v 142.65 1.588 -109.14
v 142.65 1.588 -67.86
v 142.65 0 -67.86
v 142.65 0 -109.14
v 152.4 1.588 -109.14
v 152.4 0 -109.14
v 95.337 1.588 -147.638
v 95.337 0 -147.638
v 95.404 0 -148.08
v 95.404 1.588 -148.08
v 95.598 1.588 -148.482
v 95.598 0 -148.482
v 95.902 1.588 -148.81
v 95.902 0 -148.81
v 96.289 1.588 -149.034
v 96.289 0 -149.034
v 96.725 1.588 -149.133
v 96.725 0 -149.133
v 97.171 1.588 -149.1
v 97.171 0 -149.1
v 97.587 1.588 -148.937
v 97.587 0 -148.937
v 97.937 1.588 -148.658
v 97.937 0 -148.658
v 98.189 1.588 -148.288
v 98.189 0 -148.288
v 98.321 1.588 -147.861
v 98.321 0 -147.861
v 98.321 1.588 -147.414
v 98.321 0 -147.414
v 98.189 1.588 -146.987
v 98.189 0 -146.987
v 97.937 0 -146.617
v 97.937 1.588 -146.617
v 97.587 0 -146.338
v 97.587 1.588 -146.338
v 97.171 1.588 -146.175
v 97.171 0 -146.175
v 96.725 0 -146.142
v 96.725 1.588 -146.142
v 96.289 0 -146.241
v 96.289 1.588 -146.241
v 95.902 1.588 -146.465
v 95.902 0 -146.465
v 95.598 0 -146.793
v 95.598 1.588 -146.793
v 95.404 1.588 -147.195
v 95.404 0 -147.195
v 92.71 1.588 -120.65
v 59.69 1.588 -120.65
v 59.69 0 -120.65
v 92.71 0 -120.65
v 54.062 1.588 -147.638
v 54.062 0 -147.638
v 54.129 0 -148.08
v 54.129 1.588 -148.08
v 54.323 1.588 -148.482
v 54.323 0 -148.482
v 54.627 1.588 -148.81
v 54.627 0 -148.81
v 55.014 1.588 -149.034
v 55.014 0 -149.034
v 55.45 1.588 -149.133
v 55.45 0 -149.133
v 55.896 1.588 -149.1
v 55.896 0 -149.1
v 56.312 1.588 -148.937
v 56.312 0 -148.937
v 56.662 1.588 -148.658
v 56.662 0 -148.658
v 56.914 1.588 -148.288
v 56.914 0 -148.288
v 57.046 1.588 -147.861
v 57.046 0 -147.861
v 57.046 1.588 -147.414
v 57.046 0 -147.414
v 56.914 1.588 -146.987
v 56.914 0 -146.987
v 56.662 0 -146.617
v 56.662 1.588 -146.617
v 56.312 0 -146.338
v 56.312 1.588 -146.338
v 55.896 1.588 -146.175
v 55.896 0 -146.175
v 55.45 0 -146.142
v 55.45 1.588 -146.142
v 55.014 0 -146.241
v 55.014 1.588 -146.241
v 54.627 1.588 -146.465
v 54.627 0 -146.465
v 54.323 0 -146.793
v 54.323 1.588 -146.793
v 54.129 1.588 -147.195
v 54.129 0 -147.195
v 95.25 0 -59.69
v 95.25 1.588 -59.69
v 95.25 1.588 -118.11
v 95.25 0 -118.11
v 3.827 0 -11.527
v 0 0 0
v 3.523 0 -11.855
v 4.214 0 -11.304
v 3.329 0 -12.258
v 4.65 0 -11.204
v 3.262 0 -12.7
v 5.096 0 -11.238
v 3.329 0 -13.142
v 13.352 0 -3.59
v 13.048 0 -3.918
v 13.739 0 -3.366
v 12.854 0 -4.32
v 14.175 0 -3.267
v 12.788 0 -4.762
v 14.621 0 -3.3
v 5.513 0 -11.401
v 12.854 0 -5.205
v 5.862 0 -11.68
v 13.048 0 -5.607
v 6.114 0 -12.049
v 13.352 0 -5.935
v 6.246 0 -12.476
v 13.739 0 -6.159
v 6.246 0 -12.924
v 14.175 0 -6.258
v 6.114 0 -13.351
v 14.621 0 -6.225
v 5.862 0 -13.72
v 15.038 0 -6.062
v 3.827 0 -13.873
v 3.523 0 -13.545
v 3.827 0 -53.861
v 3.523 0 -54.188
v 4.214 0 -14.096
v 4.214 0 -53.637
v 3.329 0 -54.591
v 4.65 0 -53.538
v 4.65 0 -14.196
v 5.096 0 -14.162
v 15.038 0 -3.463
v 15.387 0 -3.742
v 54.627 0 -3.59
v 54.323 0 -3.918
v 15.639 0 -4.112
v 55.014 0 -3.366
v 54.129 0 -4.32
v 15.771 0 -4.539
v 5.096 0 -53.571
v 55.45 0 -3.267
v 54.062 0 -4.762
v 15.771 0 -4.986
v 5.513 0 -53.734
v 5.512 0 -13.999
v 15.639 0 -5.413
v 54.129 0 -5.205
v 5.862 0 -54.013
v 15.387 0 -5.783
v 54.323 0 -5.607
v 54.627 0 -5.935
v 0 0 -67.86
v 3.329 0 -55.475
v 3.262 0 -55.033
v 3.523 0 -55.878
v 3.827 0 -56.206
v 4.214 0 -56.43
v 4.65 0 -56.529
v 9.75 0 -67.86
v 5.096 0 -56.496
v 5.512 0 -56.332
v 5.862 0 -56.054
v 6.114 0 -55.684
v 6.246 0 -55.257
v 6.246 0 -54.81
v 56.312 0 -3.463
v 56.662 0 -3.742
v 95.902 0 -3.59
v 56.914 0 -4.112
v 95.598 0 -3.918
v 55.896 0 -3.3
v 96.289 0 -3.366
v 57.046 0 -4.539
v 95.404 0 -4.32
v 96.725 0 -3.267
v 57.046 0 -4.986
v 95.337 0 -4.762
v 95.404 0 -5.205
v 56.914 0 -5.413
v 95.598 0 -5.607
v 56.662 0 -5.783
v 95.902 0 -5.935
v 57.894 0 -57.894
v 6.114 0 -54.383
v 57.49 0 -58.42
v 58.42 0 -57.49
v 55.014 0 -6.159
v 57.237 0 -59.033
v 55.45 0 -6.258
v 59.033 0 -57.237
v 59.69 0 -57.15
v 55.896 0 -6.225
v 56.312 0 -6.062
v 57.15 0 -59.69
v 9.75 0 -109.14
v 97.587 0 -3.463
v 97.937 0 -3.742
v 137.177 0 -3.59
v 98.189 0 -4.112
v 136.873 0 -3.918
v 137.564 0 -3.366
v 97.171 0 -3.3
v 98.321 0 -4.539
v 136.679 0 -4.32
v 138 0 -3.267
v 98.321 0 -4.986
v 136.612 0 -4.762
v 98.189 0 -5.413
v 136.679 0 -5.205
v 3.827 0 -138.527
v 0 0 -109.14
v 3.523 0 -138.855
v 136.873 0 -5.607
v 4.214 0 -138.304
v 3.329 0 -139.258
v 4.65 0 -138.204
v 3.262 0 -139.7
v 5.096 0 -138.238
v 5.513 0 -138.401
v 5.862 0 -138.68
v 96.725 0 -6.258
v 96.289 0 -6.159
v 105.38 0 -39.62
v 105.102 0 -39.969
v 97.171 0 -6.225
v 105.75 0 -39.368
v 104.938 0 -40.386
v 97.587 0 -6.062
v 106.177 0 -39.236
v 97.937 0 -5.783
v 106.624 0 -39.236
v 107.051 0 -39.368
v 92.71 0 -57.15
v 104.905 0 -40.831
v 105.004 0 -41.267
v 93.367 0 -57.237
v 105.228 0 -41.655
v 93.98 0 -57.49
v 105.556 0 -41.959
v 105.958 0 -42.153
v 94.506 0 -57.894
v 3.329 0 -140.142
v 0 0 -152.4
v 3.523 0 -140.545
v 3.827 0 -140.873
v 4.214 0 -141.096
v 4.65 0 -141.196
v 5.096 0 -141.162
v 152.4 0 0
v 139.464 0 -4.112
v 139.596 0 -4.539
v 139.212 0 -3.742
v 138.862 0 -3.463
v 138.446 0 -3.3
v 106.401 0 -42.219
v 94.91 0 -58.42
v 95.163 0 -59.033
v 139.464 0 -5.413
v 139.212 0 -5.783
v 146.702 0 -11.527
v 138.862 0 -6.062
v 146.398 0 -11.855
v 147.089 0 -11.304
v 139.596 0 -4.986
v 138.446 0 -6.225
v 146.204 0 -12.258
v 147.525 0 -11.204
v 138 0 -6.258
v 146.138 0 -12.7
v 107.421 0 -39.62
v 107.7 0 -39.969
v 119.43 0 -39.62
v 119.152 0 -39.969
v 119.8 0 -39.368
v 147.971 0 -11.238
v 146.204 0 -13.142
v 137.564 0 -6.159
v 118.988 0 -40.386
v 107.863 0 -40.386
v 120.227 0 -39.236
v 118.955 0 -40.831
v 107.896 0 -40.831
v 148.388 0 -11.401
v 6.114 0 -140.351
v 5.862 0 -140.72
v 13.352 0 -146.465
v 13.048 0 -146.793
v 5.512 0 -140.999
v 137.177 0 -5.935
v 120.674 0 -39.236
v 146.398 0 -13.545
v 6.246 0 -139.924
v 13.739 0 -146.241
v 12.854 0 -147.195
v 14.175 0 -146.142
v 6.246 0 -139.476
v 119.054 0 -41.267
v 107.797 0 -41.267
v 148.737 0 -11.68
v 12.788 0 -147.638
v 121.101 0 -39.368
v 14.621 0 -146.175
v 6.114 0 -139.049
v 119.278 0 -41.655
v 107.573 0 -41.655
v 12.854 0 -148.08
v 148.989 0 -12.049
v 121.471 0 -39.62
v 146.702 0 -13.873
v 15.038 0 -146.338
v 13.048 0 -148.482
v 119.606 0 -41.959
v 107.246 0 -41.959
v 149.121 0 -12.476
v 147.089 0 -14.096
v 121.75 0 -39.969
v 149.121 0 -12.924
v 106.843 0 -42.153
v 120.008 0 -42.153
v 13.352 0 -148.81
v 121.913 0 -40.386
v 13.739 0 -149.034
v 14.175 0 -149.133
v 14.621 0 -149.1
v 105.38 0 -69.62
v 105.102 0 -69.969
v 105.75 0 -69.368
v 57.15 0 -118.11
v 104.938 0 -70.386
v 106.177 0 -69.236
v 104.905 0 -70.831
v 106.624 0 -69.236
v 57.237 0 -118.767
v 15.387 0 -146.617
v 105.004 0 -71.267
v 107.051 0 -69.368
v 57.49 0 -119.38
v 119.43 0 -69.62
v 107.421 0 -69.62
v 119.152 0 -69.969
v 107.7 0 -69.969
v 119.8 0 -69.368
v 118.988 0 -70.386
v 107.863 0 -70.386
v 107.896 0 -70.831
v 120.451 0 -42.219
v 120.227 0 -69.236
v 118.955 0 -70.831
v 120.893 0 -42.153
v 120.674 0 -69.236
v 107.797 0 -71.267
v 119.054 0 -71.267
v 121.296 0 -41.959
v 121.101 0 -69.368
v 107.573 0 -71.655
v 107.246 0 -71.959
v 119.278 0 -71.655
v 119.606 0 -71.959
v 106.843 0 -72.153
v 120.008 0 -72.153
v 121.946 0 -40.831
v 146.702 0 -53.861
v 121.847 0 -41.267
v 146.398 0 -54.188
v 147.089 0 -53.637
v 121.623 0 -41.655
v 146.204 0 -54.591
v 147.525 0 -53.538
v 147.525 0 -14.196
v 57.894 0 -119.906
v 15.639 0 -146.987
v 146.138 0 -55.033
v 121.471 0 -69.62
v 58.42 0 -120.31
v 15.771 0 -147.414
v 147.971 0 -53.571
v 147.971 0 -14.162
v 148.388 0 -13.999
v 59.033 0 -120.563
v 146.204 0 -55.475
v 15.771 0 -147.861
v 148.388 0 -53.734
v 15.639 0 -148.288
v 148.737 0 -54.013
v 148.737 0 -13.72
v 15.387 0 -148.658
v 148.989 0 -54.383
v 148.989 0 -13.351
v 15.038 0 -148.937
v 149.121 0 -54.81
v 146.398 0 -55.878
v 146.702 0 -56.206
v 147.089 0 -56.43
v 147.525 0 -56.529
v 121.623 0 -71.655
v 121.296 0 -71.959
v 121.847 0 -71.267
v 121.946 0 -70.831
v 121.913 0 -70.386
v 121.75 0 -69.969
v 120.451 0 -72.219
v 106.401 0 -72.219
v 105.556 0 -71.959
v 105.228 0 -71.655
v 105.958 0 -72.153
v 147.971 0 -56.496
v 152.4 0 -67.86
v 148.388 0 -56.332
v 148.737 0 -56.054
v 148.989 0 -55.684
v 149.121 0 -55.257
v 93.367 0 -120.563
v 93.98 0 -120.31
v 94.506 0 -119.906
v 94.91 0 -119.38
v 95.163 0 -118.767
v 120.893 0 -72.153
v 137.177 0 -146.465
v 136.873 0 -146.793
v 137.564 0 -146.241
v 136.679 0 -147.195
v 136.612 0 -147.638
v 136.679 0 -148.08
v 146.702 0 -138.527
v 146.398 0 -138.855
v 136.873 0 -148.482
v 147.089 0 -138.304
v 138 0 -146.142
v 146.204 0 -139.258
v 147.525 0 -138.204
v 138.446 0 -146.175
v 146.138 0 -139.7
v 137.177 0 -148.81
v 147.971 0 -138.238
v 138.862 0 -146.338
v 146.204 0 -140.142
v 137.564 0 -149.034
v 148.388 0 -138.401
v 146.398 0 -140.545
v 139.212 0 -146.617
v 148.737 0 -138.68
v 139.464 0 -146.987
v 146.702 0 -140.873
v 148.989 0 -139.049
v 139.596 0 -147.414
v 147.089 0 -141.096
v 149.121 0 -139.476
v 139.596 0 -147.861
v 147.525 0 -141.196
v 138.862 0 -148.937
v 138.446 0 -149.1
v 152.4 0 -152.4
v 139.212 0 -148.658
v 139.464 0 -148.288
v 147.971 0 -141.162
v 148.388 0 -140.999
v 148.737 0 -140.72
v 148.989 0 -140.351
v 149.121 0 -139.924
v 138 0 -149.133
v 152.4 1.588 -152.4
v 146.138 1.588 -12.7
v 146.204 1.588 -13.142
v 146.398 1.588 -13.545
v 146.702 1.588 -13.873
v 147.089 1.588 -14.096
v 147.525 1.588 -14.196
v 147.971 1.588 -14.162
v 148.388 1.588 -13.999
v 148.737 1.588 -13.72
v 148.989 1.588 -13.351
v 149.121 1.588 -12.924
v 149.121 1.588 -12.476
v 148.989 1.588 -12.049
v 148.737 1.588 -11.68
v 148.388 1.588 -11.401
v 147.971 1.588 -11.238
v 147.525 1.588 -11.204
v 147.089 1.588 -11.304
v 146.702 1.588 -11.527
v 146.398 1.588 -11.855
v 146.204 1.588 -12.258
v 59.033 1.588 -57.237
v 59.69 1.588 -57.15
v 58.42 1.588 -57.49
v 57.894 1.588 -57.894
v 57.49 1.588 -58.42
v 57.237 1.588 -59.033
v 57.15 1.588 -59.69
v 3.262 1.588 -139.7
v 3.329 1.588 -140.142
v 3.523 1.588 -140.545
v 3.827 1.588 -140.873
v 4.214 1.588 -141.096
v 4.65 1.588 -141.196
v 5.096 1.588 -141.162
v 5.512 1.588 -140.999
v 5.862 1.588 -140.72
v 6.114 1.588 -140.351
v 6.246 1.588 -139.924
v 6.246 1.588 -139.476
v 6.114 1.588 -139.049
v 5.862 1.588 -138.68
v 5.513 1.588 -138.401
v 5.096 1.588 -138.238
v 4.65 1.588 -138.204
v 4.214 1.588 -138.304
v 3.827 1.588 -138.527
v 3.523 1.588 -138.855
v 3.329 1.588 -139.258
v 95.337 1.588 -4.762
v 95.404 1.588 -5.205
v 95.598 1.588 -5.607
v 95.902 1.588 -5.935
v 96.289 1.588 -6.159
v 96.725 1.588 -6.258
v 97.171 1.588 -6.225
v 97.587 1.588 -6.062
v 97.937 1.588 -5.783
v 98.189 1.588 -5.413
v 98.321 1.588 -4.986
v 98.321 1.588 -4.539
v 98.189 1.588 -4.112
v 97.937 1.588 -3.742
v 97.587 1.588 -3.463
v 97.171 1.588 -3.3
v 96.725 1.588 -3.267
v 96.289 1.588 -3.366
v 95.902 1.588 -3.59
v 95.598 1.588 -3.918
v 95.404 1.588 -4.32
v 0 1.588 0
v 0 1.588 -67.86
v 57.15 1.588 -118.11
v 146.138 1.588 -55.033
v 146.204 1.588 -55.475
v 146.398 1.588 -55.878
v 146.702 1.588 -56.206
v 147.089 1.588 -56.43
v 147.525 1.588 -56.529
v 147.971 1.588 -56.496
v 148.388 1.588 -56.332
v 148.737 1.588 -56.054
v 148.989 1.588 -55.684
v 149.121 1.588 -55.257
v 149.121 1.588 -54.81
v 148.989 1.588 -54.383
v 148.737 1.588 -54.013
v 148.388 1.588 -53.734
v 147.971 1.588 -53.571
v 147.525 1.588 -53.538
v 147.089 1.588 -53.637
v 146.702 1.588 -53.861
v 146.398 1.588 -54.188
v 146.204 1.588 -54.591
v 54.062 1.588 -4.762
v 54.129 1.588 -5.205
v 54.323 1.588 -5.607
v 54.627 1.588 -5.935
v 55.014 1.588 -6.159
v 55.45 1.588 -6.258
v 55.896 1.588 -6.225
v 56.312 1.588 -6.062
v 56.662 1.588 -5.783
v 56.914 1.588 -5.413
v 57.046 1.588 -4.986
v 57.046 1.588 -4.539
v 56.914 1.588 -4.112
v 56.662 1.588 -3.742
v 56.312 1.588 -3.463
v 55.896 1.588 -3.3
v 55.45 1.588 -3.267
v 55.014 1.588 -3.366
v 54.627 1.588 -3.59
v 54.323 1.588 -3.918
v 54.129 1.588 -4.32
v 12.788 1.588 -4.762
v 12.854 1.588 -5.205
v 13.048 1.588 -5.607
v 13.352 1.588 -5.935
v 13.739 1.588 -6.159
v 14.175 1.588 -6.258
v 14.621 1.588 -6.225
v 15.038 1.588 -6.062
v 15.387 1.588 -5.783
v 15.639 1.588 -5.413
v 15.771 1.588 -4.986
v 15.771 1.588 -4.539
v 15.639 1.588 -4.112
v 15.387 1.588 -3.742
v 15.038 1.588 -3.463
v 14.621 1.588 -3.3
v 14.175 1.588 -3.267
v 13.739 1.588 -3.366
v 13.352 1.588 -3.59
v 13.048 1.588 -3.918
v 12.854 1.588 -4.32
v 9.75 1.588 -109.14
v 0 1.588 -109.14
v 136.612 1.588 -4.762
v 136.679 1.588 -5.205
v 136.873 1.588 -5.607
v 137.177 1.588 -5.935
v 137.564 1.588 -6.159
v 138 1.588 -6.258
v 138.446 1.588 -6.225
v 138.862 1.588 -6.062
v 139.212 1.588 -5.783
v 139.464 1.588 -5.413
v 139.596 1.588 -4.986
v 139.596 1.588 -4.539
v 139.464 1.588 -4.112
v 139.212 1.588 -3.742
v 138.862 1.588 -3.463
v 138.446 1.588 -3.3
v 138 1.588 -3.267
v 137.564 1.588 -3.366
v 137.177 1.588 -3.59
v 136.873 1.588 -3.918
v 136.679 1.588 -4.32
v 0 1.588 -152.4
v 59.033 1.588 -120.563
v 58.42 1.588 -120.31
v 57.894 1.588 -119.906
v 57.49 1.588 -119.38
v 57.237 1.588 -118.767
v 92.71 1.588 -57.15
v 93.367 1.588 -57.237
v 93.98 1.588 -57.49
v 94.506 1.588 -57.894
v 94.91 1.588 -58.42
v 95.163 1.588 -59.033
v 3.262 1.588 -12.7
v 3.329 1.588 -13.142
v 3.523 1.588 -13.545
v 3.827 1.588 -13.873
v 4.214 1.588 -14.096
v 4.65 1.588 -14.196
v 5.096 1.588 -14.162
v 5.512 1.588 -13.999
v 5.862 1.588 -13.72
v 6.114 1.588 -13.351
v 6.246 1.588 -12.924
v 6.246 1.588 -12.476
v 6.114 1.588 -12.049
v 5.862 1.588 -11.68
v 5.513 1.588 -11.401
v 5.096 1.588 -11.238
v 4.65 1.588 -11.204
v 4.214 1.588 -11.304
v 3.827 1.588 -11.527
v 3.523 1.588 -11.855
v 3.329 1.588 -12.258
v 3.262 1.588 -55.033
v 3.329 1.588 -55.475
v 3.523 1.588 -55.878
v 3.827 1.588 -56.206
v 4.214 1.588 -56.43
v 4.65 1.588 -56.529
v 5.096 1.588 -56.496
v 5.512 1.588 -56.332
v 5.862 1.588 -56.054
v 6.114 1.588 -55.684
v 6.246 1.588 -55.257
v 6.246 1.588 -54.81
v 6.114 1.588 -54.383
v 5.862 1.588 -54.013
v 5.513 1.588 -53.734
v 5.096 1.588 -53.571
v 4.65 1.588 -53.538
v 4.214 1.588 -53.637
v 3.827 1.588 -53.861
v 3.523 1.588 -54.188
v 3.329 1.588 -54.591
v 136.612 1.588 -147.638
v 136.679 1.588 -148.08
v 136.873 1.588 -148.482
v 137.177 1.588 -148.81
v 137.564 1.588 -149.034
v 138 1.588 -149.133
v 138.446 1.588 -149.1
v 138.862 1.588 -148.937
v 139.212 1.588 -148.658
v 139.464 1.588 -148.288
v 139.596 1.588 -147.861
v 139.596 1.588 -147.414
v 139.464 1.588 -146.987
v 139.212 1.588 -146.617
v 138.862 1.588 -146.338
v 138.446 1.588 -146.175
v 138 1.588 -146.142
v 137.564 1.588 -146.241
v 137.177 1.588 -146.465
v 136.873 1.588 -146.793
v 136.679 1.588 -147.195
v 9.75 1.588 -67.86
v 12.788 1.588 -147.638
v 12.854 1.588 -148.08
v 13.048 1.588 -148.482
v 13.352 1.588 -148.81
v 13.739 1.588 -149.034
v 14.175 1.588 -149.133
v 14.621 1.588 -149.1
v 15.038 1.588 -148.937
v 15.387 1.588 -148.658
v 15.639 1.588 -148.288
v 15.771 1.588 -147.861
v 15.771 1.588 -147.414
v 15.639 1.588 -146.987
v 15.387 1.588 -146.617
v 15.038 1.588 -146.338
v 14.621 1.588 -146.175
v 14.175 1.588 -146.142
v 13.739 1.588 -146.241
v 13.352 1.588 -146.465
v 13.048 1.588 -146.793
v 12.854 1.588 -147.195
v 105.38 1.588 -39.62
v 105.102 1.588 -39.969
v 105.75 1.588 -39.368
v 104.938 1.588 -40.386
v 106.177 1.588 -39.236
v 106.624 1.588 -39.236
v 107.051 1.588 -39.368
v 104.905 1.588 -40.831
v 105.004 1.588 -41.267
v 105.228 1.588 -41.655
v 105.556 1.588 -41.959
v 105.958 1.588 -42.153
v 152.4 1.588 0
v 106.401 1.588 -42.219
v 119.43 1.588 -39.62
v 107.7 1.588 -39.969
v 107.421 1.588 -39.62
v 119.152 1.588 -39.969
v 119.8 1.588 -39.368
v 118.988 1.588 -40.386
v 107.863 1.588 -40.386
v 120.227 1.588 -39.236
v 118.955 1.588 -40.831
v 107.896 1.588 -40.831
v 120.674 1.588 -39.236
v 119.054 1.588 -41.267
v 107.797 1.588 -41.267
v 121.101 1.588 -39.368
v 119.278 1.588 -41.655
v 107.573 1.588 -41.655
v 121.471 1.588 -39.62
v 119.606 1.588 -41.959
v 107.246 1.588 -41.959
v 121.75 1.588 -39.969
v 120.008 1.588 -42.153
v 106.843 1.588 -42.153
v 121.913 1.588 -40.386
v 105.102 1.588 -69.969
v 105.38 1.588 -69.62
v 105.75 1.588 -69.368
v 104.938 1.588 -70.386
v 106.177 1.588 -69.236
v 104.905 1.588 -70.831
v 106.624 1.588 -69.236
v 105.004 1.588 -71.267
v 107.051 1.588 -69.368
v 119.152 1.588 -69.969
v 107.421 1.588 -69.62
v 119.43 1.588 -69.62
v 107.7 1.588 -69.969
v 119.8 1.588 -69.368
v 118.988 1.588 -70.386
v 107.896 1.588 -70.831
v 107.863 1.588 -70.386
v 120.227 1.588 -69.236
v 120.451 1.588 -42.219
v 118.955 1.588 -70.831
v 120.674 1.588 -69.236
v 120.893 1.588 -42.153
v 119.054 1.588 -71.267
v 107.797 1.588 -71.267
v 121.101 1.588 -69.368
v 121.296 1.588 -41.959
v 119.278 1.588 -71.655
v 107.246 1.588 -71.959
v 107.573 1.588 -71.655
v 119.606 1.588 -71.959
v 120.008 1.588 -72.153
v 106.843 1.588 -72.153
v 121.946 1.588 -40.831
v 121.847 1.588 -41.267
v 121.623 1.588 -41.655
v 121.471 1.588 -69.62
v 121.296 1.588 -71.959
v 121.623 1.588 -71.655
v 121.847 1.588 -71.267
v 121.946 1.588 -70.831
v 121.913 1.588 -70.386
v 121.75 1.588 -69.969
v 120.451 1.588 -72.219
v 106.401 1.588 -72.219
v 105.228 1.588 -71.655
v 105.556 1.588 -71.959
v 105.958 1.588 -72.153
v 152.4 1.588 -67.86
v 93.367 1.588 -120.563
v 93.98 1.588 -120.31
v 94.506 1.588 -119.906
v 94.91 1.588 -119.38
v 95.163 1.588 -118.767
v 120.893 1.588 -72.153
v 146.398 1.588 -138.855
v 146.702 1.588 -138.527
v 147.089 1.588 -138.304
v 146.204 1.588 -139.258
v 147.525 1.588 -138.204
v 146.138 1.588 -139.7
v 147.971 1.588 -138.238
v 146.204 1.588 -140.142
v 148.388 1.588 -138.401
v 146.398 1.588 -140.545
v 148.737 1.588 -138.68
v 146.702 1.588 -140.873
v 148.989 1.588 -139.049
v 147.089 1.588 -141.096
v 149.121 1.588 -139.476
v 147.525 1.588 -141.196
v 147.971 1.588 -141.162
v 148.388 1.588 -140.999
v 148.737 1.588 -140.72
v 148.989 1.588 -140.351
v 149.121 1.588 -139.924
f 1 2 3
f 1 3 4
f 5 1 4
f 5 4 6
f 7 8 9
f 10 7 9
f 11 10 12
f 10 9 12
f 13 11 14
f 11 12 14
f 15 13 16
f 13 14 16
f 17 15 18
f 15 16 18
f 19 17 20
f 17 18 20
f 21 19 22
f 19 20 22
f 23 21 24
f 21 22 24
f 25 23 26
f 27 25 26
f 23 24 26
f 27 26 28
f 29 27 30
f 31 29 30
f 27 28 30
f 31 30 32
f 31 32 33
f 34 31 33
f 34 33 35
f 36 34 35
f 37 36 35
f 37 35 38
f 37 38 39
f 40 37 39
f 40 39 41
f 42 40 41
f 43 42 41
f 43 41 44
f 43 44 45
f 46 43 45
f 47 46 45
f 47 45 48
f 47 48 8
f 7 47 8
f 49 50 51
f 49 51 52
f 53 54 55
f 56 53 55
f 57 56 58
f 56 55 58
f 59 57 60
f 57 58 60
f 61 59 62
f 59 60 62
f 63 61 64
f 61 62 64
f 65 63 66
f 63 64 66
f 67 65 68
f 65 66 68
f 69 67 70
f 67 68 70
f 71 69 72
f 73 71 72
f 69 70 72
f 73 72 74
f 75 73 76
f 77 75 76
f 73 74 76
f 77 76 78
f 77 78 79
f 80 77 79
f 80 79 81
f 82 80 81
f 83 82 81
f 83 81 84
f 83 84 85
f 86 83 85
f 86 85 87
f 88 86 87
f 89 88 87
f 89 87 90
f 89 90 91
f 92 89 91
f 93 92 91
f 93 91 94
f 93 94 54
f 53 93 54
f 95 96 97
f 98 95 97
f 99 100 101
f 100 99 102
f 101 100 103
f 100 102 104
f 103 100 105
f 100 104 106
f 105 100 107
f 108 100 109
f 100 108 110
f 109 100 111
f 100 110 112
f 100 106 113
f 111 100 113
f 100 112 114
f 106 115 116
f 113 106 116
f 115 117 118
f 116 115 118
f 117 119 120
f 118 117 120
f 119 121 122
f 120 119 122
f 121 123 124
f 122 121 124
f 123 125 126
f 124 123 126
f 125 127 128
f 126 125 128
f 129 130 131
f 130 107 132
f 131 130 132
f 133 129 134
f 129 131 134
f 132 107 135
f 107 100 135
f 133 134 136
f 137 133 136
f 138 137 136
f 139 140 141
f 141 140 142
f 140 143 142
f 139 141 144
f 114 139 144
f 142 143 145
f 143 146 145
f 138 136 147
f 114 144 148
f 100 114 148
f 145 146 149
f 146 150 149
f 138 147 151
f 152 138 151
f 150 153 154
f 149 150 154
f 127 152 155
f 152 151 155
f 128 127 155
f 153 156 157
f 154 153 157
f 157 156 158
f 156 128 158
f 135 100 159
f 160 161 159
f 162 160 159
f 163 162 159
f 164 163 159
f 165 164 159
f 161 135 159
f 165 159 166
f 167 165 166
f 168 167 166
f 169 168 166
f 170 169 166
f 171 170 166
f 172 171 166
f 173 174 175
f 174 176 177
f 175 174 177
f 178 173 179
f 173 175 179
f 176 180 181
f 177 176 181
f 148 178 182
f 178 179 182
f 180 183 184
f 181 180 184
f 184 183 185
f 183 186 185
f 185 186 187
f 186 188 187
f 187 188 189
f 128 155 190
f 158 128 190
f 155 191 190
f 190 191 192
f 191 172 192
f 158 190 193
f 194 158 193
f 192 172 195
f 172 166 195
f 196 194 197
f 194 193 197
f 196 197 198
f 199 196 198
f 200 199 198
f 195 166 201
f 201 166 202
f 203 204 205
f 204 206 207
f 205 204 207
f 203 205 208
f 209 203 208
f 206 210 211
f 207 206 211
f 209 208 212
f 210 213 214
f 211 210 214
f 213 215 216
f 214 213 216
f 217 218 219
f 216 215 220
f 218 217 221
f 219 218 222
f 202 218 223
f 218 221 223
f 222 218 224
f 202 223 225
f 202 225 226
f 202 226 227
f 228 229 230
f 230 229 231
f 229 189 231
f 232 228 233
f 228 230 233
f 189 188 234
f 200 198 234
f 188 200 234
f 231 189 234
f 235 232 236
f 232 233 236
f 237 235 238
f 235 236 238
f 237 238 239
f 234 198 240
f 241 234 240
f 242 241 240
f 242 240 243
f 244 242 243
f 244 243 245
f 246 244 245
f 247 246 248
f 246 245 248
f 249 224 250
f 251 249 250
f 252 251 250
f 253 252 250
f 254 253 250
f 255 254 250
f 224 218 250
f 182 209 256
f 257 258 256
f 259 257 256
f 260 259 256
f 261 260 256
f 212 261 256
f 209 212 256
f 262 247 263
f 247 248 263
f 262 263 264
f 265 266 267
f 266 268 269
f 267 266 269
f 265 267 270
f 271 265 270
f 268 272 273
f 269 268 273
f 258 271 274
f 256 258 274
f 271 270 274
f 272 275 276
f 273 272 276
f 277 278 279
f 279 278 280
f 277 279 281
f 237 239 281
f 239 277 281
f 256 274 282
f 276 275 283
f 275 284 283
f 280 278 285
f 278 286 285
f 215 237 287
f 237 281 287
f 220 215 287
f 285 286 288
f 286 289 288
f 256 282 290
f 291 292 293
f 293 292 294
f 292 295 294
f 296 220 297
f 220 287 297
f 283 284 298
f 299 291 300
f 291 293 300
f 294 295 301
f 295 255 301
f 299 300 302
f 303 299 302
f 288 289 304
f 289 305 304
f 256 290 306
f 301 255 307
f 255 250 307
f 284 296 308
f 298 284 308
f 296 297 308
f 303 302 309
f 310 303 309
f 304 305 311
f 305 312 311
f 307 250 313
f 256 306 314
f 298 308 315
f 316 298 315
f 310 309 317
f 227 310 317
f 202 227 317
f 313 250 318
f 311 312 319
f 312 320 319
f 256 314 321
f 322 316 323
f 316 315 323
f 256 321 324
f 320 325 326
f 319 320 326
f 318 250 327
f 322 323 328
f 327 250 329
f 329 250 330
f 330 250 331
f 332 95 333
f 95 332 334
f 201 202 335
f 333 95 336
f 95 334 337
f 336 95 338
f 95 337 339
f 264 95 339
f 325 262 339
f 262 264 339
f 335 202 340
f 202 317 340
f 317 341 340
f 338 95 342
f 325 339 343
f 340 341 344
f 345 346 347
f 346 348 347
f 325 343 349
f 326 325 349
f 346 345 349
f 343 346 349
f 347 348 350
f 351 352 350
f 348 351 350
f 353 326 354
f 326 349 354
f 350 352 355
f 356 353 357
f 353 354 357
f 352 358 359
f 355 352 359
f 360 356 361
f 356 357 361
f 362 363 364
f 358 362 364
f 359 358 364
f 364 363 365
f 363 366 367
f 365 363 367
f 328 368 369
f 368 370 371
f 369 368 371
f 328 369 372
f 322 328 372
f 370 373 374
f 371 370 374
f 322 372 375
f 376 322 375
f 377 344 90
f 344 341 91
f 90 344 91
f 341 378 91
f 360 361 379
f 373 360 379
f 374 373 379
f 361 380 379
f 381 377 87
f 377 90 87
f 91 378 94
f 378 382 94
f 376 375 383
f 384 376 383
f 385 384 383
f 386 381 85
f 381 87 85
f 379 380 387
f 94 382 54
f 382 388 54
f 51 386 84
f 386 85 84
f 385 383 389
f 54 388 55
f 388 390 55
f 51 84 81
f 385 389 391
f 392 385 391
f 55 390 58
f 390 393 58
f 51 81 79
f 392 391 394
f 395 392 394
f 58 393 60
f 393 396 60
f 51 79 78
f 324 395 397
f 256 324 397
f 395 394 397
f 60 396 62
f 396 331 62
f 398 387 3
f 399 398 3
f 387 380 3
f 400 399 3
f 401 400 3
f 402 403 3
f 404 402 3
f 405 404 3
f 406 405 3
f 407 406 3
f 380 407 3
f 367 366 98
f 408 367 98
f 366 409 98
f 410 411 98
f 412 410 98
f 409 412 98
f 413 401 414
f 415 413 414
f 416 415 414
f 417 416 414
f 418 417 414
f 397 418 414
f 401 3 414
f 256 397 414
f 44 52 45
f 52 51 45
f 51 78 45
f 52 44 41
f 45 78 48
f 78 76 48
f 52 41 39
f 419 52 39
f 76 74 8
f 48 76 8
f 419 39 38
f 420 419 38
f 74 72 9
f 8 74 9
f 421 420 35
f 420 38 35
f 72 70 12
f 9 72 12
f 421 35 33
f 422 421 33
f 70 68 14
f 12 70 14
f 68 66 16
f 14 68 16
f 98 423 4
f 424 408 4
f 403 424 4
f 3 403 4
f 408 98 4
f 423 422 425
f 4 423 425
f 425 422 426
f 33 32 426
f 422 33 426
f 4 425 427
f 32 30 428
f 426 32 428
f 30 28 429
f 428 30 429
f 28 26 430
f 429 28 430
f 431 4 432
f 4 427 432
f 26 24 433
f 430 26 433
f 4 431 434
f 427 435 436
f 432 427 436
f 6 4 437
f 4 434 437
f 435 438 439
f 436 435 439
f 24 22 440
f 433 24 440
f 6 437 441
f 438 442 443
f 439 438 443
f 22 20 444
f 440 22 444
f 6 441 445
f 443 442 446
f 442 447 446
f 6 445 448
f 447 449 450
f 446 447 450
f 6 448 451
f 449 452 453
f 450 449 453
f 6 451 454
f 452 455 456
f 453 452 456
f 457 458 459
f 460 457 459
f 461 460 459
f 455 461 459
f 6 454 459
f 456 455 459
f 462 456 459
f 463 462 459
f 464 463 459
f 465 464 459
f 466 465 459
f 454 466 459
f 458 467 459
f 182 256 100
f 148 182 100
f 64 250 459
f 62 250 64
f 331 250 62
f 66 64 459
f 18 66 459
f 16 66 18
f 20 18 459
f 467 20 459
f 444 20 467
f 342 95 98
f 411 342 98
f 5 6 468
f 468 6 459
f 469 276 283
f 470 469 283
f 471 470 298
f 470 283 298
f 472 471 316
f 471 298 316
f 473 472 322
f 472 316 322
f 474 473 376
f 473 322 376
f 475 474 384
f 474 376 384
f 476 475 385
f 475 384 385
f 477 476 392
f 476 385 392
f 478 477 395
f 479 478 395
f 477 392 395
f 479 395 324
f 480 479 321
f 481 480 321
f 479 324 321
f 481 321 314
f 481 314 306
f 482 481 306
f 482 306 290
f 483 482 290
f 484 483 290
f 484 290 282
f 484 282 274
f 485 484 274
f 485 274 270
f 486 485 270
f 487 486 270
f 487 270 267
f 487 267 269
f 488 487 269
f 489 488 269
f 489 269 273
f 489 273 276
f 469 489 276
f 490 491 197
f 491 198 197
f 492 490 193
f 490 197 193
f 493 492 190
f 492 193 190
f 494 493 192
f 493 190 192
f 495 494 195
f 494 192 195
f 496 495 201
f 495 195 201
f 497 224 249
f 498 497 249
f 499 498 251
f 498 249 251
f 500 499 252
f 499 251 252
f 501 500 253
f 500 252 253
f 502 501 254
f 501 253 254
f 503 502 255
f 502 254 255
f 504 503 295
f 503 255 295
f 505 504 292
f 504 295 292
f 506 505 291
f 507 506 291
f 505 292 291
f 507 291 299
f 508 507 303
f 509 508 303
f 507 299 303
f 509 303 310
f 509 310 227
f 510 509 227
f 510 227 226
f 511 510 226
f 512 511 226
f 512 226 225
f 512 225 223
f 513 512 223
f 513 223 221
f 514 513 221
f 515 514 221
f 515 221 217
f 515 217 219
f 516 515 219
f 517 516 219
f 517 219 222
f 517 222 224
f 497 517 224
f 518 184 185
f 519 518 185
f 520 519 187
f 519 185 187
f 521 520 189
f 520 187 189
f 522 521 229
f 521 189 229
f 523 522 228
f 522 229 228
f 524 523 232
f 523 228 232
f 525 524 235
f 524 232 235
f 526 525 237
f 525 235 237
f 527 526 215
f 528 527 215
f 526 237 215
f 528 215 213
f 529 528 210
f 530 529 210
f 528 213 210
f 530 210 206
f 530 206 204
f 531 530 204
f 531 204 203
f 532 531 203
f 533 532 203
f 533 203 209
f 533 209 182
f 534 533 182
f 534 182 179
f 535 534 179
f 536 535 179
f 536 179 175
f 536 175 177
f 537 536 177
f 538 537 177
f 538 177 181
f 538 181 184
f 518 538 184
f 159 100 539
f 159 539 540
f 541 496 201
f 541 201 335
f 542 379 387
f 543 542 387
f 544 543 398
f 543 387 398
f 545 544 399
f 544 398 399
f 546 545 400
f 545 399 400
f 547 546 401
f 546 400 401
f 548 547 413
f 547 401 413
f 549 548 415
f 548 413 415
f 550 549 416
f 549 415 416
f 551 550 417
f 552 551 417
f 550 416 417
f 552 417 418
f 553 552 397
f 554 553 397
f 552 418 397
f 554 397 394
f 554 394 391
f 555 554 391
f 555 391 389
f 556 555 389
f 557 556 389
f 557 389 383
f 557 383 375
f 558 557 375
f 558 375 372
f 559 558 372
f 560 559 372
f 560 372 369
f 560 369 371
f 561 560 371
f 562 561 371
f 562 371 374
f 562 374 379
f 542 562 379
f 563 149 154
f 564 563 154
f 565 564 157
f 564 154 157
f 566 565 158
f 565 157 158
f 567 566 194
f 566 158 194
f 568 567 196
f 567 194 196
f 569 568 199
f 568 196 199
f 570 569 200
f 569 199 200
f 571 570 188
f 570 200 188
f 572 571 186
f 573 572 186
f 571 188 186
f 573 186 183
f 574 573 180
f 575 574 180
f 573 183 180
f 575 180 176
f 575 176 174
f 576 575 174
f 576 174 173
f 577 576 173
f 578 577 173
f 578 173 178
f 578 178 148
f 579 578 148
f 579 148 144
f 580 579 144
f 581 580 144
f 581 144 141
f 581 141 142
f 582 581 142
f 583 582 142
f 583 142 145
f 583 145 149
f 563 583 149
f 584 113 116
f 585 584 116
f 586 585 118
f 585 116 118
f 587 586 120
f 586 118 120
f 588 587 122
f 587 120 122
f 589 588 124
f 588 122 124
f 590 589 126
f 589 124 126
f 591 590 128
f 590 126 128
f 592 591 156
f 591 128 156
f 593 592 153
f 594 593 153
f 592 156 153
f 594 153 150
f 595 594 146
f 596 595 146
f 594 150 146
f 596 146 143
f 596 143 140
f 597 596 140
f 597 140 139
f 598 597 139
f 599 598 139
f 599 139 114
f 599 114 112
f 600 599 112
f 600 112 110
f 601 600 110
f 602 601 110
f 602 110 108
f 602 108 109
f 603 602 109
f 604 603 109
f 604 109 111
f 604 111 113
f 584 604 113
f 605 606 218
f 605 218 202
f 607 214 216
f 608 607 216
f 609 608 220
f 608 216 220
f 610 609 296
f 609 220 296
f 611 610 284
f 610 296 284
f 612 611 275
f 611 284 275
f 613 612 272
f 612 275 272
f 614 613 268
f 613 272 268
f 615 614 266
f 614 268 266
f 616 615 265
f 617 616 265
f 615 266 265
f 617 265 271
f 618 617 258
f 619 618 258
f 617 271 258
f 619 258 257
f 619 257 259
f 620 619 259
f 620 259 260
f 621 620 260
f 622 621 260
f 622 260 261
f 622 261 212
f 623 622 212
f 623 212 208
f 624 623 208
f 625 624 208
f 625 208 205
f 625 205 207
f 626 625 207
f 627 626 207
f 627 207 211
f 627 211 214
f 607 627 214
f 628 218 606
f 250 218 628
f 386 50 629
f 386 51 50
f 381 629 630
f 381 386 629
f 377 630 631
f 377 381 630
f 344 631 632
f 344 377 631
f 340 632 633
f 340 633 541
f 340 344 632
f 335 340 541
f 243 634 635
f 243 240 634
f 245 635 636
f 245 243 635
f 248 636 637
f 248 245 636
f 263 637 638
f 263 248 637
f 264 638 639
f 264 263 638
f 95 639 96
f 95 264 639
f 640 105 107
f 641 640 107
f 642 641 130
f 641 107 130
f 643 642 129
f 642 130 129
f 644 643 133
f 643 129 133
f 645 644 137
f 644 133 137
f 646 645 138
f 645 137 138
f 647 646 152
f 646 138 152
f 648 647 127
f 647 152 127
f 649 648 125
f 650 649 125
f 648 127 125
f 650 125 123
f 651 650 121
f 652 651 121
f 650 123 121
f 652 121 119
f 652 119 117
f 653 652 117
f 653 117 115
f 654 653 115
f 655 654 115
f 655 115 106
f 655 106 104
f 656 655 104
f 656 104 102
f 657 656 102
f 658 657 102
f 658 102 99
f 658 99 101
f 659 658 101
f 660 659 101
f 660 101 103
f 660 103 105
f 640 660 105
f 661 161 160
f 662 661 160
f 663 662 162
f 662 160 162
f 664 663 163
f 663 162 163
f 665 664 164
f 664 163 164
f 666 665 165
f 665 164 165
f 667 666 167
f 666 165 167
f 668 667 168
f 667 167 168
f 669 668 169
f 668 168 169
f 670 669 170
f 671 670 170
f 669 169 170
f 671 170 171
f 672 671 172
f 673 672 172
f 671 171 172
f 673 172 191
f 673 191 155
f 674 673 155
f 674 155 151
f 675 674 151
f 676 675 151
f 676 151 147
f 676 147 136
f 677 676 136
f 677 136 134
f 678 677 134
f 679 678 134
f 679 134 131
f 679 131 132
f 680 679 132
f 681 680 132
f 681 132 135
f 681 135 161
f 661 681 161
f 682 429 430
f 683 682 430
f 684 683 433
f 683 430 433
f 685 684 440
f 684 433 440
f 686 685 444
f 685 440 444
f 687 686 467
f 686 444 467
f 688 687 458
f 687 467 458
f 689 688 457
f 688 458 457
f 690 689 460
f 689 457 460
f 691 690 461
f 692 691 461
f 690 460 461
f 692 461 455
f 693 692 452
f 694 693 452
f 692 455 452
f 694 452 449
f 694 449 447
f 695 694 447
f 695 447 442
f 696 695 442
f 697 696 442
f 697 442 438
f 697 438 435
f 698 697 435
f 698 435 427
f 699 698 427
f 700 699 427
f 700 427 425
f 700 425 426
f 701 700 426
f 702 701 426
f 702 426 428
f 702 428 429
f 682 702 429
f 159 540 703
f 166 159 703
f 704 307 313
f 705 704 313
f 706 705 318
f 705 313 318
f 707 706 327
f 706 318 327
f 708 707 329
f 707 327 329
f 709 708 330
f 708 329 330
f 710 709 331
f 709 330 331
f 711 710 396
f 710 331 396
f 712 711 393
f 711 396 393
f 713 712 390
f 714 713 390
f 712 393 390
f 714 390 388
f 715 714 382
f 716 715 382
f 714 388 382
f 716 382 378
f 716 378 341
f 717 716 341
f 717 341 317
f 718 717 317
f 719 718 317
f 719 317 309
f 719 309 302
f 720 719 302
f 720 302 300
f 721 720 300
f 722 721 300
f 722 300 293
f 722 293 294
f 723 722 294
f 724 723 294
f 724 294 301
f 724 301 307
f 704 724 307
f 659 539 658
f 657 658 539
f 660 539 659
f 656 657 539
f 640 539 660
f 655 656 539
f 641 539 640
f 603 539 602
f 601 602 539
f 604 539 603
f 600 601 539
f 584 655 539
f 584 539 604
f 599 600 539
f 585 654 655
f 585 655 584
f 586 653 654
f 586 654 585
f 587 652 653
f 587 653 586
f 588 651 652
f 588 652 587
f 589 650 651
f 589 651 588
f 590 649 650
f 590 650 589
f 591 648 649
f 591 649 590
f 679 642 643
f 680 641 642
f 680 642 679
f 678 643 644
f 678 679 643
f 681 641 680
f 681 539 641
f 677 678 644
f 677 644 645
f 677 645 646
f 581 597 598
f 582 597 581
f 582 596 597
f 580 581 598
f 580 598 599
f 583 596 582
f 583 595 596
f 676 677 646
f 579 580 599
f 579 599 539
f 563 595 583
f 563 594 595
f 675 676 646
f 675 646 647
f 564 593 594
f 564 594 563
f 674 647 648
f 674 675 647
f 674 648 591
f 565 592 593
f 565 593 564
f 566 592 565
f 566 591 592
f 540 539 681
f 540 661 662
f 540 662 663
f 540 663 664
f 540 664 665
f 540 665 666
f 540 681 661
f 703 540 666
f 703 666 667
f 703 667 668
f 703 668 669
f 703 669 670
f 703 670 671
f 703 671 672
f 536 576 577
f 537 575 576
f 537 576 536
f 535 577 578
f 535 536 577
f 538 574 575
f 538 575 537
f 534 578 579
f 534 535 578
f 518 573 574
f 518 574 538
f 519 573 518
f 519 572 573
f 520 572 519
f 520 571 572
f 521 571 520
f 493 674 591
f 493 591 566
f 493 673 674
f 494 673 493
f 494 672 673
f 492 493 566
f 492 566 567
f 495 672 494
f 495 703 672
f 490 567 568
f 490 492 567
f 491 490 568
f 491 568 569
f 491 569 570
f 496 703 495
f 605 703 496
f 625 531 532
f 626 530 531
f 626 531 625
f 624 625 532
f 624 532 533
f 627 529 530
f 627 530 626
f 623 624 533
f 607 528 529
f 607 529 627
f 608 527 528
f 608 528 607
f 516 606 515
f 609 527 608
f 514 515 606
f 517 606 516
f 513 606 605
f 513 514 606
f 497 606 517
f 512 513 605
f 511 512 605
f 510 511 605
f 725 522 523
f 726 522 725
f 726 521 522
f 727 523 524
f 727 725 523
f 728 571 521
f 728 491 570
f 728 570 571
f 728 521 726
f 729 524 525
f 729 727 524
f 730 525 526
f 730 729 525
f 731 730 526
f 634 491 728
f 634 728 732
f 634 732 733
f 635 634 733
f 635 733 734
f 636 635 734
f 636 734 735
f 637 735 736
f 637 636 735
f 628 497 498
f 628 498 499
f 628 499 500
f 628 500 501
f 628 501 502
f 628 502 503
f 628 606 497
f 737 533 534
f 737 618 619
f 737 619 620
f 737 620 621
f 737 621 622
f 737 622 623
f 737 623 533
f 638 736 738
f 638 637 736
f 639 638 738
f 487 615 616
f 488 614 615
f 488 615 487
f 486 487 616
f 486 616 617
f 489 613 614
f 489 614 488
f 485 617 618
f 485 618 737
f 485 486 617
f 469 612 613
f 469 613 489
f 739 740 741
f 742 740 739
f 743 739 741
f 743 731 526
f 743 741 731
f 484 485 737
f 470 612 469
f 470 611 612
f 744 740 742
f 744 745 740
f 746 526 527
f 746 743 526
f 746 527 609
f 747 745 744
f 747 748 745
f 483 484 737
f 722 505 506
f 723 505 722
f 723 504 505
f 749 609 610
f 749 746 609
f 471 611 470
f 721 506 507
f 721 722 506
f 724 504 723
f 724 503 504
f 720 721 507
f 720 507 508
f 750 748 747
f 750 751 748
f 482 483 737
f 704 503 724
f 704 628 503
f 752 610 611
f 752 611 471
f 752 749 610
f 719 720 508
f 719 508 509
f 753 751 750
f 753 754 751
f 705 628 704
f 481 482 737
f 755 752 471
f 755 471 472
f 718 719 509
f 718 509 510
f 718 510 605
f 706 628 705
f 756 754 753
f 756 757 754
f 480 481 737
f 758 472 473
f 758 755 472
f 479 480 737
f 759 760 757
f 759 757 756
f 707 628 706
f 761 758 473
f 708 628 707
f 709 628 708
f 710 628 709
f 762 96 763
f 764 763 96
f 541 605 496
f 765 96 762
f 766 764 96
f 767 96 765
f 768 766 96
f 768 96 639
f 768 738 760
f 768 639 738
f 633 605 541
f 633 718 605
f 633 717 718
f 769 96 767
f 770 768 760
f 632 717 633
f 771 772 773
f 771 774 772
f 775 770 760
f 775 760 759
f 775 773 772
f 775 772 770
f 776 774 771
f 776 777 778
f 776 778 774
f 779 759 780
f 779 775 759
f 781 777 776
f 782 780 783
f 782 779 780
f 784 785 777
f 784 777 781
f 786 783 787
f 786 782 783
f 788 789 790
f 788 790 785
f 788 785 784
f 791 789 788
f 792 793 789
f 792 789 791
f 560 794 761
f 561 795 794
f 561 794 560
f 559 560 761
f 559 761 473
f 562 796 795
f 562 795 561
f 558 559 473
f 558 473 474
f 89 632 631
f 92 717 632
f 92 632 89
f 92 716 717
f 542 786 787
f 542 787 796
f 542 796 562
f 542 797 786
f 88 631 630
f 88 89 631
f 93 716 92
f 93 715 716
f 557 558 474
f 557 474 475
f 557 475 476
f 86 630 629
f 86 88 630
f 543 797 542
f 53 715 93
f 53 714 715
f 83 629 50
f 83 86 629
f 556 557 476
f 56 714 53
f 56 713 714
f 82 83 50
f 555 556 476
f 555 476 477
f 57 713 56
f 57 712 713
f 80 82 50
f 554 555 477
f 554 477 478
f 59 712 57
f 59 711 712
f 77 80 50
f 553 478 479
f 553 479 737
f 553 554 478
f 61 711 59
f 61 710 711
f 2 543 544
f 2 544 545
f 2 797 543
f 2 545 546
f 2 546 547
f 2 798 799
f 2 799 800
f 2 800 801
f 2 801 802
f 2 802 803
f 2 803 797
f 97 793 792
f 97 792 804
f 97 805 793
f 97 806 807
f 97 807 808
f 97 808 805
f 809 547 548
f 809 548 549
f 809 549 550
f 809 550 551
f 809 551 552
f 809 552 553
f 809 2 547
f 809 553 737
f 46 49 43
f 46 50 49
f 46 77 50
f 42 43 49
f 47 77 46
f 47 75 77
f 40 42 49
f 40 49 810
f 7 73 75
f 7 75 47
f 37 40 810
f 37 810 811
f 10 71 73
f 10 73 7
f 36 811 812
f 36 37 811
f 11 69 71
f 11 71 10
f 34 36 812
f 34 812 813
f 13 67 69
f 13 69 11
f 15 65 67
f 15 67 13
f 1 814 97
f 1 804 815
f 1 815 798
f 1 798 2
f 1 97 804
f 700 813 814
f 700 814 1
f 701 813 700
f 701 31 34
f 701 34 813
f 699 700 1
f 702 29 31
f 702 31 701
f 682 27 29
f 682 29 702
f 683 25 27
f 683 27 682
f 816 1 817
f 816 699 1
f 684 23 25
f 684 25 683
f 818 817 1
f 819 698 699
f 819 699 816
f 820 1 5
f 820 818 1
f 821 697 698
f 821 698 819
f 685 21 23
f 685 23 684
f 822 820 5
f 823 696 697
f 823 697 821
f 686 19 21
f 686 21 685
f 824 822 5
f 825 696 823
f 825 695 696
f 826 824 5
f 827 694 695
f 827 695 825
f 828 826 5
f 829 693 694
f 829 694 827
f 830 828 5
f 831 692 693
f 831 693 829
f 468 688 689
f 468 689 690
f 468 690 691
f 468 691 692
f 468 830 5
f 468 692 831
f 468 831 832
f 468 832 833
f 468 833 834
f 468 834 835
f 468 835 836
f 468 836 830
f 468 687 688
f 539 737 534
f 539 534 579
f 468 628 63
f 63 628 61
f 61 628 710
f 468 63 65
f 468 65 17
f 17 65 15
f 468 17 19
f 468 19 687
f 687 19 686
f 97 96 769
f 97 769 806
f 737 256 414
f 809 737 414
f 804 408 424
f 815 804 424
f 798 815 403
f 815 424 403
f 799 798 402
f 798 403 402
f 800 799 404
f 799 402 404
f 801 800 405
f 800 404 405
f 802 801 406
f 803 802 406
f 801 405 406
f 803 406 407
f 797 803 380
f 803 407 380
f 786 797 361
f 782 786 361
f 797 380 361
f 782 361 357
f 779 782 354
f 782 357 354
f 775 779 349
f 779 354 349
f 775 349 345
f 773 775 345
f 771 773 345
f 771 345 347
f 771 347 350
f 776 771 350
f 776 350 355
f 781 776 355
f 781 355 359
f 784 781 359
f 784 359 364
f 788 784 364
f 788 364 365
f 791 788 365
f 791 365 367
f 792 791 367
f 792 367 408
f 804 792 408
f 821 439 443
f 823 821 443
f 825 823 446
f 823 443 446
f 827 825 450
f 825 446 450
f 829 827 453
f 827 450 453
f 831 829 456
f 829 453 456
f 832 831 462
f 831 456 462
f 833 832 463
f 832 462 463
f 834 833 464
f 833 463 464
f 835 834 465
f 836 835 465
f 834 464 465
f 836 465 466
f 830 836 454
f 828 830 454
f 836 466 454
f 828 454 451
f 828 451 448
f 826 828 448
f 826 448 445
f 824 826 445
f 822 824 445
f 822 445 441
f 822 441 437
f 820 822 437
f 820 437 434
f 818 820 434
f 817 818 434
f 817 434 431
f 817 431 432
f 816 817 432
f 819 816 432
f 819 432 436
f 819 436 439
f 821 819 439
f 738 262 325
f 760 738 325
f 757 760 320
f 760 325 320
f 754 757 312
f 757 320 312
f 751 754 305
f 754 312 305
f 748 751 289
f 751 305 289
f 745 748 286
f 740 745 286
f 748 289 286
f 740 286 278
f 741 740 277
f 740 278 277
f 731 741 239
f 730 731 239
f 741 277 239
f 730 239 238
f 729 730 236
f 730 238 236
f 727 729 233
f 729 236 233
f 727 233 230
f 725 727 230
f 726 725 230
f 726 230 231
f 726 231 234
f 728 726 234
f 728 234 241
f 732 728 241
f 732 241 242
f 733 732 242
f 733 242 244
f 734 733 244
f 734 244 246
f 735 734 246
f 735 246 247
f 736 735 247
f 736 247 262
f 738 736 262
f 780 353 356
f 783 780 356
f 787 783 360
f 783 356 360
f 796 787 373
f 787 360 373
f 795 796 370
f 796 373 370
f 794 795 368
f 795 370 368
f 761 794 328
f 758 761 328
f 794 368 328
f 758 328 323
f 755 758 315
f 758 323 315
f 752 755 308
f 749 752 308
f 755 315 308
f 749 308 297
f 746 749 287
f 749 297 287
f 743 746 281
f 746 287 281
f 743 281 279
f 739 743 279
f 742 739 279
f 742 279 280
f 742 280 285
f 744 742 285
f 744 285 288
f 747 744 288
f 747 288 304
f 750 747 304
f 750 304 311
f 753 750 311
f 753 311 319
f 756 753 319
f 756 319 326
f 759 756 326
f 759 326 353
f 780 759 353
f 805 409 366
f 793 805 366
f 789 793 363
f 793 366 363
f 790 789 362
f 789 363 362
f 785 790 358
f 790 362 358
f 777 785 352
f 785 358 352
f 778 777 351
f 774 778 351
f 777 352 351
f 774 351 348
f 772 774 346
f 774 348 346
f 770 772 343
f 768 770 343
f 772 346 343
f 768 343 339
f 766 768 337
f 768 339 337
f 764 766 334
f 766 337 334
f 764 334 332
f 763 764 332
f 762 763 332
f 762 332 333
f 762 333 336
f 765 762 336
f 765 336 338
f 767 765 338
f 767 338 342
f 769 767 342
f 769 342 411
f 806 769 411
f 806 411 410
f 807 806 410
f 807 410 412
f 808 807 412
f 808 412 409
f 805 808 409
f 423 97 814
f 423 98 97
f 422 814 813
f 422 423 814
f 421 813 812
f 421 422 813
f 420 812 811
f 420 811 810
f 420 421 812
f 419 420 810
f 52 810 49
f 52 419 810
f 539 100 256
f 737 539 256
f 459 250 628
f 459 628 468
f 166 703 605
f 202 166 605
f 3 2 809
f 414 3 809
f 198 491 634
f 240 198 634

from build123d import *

# Parameters (mm, degrees)
SKETCH2_W             = 152.4
SKETCH2_H             = 152.4
BOSS_EXTRUDE1_DEPTH   = 1.5875
F_3_0MM_DOWEL_HOLE1_D = 3
F_3_0MM_DOWEL_HOLE2_D = 3
LPATTERN1_COUNT       = 4
LPATTERN1_PITCH       = 42.333333333
LPATTERN2_COUNT       = 4
LPATTERN2_PITCH       = 41.275
SKETCH12_W            = 38.1
SKETCH12_H            = 63.5
CUT_EXTRUDE1_DEPTH    = 2.54
FILLET2_R             = 2.54
SKETCH13_W            = 9.75
SKETCH13_H            = 41.28
CUT_EXTRUDE2_DEPTH    = 216.531993347
SKETCH14_R            = 1.5
CUT_EXTRUDE3_DEPTH    = 10


with BuildPart() as part:
    # Sketch2 → Boss-Extrude1 (new body)
    with BuildSketch(Plane(origin=(0, 0, 0), x_dir=(1, 0, 0), z_dir=(0, 1, 0))):
        with Locations((76.2, 76.2)):
            Rectangle(SKETCH2_W, SKETCH2_H)
    extrude(amount=BOSS_EXTRUDE1_DEPTH)

    # Ø3.0mm Dowel Hole1 (through all)
    with Locations(Plane(origin=(0, 1.5875, 0), x_dir=(1, 0, 0), z_dir=(0, 1, 0))):
        with Locations((14.2875, 147.6375), (14.2875, 4.7625)):
            f_3_0mm_dowel_hole1 = Hole(F_3_0MM_DOWEL_HOLE1_D / 2)

    # Ø3.0mm Dowel Hole2 (through all)
    with Locations(Plane(origin=(0, 1.5875, 0), x_dir=(1, 0, 0), z_dir=(0, 1, 0))):
        with Locations((4.7625, 139.7), (147.6375, 139.7)):
            f_3_0mm_dowel_hole2 = Hole(F_3_0MM_DOWEL_HOLE2_D / 2)

    # LPattern1: Ø3.0mm Dowel Hole2 ×4, 1 skipped
    with Locations(*[(0, 0, i * LPATTERN1_PITCH) for i in range(1, LPATTERN1_COUNT) if i not in (1,)]):
        add(f_3_0mm_dowel_hole2, mode=Mode.SUBTRACT)

    # LPattern2: Ø3.0mm Dowel Hole1 ×4
    with Locations(*[(i * LPATTERN2_PITCH, 0, 0) for i in range(1, LPATTERN2_COUNT)]):
        add(f_3_0mm_dowel_hole1, mode=Mode.SUBTRACT)

    # Sketch12 → Cut-Extrude1 (cut)
    with BuildSketch(Plane(origin=(0, 1.5875, 0), x_dir=(1, 0, 0), z_dir=(0, 1, 0))):
        with Locations((76.2, 88.9)):
            Rectangle(SKETCH12_W, SKETCH12_H)
    extrude(amount=-CUT_EXTRUDE1_DEPTH, mode=Mode.SUBTRACT)

    # Fillet2
    fillet2_edges = [part.edges().sort_by_distance(p)[0] for p in [
        (95.25, 0.79375, -120.65),
        (95.25, 0.79375, -57.15),
        (57.15, 0.79375, -57.15),
        (57.15, 0.79375, -120.65),
    ]]
    fillet(fillet2_edges, radius=FILLET2_R)

    # Sketch13 → Cut-Extrude2 (cut, through all)
    with BuildSketch(Plane(origin=(0, 1.5875, 0), x_dir=(1, 0, 0), z_dir=(0, 1, 0))):
        with Locations((147.525, 88.5)):
            Rectangle(SKETCH13_W, SKETCH13_H)
        with Locations((4.875, 88.5)):
            Rectangle(SKETCH13_W, SKETCH13_H)
    extrude(amount=-CUT_EXTRUDE2_DEPTH, mode=Mode.SUBTRACT)

    # Sketch14 → Cut-Extrude3 (cut)
    with BuildSketch(Plane.XZ):
        with Locations(Location((120.450623047, -40.719396702, 0), (0, 0, 270))):
            Circle(SKETCH14_R)
        with Locations(Location((106.400623047, -40.719396702, 0), (0, 0, 270))):
            Circle(SKETCH14_R)
        with Locations(Location((106.400623047, -70.719396702, 0), (0, 0, 270))):
            Circle(SKETCH14_R)
        with Locations(Location((120.450623047, -70.719396702, 0), (0, 0, 270))):
            Circle(SKETCH14_R)
    extrude(amount=-CUT_EXTRUDE3_DEPTH, mode=Mode.SUBTRACT)


solid = part.part
